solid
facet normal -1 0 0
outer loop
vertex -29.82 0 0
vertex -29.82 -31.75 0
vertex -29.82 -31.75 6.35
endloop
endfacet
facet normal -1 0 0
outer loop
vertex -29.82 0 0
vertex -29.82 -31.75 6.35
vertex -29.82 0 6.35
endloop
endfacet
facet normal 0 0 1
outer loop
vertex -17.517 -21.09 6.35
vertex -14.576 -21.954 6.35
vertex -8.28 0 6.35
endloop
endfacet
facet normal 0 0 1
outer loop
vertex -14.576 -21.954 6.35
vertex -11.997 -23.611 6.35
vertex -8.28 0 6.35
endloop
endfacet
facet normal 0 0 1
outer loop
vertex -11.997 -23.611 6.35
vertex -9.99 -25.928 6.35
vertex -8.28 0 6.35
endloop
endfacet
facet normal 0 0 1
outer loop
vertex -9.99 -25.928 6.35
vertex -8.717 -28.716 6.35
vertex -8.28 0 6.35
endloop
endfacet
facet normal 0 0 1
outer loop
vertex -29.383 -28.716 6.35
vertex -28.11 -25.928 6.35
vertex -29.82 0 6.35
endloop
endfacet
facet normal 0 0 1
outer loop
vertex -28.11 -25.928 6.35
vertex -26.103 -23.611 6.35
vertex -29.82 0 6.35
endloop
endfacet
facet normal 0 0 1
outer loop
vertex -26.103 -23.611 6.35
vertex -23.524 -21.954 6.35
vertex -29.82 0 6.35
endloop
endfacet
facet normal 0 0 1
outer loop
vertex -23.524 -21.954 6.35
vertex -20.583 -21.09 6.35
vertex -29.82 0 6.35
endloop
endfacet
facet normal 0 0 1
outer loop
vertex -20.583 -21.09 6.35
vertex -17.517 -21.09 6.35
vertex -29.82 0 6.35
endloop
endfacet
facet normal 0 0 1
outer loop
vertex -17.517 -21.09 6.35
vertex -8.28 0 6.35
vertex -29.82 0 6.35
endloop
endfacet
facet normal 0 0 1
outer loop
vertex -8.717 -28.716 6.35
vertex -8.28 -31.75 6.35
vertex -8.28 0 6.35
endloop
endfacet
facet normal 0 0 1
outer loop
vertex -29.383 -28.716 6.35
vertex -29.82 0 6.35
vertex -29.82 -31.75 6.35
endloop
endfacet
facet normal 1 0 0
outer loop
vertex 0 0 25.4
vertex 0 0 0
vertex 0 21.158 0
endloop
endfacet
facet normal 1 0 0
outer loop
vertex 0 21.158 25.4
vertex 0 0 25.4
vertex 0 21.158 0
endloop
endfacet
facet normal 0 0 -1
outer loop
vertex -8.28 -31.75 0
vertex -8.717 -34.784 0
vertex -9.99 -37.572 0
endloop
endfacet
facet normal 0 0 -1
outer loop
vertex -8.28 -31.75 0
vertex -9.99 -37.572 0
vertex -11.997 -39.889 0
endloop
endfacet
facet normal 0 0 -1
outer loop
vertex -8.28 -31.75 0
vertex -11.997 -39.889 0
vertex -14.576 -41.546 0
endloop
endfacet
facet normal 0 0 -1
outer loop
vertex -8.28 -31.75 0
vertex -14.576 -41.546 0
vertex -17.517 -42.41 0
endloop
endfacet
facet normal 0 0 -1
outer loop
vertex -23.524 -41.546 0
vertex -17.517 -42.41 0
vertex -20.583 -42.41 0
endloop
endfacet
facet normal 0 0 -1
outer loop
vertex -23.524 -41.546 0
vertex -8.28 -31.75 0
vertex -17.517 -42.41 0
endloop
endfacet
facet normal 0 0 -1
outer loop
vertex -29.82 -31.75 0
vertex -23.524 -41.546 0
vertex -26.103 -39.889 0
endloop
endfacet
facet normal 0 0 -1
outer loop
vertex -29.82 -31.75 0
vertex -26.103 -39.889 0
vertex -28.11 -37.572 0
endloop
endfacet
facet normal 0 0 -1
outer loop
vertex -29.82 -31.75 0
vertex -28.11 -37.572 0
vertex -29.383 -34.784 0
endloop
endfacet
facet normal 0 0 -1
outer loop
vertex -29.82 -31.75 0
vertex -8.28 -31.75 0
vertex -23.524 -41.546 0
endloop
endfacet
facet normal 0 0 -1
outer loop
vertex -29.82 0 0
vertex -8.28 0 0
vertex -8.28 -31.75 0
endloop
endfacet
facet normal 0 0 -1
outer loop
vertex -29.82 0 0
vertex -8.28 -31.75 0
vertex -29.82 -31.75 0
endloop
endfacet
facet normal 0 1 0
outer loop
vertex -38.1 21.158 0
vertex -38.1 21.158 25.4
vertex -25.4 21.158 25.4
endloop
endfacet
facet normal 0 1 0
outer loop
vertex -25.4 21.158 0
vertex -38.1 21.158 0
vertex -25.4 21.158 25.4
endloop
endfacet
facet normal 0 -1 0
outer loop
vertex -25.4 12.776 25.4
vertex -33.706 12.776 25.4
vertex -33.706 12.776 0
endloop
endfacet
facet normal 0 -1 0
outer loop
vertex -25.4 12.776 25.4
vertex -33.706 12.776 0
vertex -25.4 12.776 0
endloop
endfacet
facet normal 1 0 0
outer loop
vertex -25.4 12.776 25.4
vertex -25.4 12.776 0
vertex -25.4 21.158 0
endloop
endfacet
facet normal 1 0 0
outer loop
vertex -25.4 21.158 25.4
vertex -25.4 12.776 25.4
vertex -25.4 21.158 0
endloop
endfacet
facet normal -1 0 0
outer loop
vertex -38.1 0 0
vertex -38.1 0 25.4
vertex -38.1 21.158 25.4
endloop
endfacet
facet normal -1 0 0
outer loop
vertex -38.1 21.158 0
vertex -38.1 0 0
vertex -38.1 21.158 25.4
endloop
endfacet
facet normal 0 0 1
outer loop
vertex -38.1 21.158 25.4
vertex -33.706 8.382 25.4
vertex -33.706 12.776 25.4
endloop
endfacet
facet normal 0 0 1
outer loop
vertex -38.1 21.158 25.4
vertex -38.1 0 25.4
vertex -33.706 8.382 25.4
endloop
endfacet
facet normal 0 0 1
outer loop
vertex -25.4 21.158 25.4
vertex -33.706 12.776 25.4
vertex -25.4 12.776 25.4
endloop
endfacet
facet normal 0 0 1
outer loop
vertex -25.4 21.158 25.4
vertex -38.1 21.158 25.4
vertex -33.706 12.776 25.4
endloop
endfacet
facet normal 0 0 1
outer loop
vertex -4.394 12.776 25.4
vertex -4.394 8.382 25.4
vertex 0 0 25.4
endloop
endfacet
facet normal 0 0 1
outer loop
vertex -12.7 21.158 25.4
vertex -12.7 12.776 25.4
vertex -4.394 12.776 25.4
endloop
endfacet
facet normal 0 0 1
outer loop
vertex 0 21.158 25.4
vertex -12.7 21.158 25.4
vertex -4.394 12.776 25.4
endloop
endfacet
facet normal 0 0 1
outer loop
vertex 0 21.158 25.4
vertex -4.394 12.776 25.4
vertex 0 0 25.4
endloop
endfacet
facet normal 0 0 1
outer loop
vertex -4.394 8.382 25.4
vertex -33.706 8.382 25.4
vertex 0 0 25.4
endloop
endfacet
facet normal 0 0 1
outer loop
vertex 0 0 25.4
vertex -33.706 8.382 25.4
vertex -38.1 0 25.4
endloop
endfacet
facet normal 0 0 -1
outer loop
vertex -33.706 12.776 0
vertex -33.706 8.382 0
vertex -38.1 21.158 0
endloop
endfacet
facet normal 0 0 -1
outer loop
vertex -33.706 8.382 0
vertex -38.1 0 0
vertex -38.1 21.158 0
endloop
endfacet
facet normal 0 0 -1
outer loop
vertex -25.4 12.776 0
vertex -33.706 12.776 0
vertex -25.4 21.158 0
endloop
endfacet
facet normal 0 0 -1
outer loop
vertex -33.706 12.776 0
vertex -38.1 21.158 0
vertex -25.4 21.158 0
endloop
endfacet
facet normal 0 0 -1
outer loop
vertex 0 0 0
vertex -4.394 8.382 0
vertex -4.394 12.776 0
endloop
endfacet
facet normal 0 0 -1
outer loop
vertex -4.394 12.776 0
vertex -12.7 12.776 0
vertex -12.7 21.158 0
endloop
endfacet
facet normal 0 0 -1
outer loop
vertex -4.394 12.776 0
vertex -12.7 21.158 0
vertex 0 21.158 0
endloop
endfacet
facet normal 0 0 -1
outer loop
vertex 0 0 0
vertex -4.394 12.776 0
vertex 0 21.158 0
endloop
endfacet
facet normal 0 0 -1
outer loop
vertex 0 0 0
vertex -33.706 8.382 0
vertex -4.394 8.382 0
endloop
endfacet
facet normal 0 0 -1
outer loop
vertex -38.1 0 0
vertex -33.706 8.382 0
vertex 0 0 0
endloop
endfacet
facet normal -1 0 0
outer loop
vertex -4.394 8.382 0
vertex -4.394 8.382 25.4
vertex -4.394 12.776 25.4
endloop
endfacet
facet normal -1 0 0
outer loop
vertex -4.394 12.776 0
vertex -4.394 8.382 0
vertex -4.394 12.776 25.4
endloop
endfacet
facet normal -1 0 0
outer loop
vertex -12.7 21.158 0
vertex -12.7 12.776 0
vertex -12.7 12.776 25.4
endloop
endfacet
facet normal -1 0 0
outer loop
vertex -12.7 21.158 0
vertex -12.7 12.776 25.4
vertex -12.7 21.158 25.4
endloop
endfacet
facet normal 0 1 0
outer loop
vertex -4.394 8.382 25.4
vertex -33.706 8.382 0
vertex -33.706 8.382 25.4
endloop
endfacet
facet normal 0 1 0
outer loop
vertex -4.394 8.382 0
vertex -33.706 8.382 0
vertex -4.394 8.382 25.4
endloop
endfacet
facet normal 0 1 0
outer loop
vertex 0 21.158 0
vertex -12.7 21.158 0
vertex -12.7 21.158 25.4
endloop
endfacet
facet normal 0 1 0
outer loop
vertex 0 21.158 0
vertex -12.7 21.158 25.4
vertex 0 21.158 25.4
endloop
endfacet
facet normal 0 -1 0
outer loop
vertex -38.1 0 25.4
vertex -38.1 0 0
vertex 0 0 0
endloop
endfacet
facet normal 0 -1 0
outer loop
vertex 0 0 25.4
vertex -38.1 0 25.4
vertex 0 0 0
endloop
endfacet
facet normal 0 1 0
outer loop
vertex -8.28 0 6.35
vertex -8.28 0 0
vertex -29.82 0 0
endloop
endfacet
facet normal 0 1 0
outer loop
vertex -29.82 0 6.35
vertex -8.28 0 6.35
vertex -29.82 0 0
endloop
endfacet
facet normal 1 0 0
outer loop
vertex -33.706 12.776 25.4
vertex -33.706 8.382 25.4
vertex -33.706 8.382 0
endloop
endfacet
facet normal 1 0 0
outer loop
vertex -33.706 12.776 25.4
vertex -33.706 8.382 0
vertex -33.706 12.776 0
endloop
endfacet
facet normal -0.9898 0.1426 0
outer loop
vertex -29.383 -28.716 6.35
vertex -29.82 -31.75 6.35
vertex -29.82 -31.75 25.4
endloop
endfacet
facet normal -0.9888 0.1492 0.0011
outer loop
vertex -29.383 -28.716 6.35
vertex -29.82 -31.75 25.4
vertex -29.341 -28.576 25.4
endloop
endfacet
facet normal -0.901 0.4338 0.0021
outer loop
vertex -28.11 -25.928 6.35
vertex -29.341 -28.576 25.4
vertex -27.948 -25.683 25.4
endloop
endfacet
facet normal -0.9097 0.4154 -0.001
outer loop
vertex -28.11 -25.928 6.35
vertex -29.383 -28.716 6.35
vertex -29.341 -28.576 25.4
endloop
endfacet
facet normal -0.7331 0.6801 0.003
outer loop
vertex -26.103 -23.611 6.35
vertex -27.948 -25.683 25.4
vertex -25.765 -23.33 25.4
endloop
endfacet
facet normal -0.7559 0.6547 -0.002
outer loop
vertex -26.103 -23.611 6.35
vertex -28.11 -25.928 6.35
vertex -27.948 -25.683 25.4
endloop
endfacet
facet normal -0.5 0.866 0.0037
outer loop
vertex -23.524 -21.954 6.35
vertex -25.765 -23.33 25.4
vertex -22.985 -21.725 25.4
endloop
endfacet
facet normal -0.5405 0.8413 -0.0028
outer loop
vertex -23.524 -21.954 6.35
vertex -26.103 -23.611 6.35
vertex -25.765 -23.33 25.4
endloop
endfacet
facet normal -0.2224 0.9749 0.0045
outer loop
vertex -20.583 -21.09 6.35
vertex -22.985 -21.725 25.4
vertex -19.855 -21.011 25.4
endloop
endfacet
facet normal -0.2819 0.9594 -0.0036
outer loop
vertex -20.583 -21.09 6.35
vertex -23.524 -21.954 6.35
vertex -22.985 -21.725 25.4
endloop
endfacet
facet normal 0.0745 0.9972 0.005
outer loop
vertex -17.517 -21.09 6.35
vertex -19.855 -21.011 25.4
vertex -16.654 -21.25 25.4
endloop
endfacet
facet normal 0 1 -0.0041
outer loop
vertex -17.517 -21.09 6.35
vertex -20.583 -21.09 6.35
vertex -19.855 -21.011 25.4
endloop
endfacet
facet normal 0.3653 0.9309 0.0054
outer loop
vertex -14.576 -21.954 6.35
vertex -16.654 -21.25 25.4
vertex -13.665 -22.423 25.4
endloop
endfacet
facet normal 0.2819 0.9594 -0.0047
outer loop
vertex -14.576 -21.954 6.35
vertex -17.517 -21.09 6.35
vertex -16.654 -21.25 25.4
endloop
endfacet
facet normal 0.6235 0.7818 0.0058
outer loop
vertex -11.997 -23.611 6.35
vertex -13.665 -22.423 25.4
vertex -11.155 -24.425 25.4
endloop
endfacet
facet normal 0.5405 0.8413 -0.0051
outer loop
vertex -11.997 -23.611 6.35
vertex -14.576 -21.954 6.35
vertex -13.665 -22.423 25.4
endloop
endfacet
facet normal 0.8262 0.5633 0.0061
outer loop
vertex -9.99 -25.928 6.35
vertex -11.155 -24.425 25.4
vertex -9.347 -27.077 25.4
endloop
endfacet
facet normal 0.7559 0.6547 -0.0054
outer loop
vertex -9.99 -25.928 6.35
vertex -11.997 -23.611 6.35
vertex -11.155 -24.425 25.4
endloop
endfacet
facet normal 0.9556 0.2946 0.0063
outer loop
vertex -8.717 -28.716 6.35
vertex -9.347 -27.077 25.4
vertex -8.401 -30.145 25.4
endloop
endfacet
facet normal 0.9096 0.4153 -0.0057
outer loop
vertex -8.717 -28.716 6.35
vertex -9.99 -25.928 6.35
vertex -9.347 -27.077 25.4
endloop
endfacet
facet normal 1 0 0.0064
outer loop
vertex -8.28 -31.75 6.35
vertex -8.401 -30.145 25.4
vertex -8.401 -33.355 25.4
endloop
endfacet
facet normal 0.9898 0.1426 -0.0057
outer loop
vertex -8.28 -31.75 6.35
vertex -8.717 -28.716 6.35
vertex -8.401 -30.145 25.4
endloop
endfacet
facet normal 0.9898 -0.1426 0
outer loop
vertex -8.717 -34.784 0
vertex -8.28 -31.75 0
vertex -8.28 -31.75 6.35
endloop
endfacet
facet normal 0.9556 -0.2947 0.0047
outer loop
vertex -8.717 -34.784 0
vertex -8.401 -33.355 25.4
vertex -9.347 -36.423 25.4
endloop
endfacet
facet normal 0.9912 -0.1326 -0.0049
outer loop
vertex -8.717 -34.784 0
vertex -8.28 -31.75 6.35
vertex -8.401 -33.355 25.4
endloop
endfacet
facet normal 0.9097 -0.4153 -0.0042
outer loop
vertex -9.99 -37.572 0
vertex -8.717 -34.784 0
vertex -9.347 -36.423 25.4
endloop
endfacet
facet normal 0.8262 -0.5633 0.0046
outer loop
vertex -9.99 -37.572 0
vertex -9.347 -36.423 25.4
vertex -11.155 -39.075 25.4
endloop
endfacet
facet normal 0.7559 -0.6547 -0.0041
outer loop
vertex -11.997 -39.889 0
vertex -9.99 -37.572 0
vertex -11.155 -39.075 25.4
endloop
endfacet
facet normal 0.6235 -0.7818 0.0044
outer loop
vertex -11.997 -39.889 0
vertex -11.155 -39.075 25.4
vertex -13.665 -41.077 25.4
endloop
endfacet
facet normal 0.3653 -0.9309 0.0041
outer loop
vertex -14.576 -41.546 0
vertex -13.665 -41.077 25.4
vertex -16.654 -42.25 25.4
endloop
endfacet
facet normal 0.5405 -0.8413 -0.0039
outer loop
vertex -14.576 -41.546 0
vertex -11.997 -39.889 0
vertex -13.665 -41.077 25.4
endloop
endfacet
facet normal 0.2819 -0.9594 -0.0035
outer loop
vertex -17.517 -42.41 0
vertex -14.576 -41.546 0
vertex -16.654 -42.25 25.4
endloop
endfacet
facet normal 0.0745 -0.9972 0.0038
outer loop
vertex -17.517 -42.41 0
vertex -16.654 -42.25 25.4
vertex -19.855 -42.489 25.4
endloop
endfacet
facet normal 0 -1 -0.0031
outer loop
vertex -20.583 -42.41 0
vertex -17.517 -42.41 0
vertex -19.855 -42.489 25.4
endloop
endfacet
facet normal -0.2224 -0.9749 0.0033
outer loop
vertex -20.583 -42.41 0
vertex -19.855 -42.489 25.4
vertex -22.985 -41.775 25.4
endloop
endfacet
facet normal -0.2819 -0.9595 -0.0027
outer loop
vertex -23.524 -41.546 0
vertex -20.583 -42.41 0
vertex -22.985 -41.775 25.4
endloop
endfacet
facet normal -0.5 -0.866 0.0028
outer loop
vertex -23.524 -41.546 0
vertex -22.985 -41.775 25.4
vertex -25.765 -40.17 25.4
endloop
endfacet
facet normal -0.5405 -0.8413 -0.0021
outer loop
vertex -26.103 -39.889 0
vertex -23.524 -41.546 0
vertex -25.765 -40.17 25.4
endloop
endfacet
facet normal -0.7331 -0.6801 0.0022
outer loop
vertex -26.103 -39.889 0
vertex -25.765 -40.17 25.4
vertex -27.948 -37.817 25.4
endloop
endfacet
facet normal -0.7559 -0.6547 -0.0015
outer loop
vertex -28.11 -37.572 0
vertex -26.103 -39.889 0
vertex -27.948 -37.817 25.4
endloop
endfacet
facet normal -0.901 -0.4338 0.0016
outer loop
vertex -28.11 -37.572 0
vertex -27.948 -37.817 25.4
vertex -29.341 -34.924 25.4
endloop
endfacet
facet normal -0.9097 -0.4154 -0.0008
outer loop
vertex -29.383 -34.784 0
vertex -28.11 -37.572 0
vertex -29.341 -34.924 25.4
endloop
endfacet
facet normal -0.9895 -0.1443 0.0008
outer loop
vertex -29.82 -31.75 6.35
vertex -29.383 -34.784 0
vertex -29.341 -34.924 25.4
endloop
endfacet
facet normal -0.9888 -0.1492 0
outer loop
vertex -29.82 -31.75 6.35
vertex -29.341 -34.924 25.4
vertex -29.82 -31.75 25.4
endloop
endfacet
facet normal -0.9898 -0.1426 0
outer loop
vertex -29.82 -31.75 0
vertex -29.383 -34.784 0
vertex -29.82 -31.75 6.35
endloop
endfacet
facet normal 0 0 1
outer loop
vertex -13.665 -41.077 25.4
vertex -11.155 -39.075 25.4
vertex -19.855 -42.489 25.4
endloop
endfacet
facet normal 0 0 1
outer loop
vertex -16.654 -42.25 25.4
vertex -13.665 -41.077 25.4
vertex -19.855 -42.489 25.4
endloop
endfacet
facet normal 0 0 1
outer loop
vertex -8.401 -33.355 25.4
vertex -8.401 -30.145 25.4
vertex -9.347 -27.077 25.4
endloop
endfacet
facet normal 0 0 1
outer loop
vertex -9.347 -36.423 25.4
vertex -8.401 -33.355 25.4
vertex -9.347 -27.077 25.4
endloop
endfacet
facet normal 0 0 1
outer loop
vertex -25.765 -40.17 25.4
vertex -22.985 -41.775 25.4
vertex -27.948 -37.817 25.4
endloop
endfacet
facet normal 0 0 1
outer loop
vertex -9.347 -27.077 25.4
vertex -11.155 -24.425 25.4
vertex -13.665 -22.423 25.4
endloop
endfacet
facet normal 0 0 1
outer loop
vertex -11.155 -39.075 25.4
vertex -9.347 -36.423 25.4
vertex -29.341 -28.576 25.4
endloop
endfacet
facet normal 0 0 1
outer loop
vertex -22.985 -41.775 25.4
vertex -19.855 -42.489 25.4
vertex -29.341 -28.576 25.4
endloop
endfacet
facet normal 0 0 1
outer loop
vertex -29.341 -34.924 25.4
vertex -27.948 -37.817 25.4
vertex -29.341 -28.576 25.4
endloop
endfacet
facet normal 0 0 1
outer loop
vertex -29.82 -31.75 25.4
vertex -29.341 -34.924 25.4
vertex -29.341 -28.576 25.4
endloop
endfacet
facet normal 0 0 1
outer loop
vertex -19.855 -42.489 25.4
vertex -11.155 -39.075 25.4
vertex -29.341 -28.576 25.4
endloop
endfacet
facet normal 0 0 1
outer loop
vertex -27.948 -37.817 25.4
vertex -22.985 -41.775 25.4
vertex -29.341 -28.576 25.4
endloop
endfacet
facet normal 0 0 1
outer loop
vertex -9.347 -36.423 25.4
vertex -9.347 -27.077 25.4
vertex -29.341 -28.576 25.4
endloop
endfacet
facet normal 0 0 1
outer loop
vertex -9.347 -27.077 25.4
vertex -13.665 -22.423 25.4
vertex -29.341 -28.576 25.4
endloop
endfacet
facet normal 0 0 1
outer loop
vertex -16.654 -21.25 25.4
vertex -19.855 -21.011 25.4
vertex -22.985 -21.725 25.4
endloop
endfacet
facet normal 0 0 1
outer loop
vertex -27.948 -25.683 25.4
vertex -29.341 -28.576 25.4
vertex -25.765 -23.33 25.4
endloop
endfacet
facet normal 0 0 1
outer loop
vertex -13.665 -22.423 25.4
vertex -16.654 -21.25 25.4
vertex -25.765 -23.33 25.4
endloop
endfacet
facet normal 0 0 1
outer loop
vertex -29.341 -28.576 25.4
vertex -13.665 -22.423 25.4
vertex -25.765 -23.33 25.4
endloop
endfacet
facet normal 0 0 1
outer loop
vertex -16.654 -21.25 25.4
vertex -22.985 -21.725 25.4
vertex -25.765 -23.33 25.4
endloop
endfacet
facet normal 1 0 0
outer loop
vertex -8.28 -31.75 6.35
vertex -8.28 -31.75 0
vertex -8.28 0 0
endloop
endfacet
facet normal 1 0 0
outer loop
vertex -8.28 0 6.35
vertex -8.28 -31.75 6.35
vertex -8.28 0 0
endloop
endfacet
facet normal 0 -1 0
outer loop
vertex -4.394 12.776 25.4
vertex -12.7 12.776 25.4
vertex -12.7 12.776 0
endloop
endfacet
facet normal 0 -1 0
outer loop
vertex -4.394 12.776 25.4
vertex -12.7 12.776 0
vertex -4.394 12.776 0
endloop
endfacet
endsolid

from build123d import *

# Parameters (mm, degrees)
SKETCH1_W           = 38.1
SKETCH1_H           = 8.382
BOSS_EXTRUDE1_DEPTH = 25.4
SKETCH2_W           = 4.3942
SKETCH2_H           = 4.3942
BOSS_EXTRUDE2_DEPTH = 25.4
SKETCH3_W           = 12.7
SKETCH3_H           = 8.382
BOSS_EXTRUDE3_DEPTH = 25.4
SKETCH4_W           = 21.5392
SKETCH4_H           = 31.75
BOSS_EXTRUDE4_DEPTH = 6.35
SKETCH5_R           = 10.7696
BOSS_EXTRUDE5_DEPTH = 25.4


with BuildPart() as part:
    # Sketch1 → Boss-Extrude1 (new body)
    with BuildSketch(Plane.XY):
        with Locations((-19.05, 4.191)):
            Rectangle(SKETCH1_W, SKETCH1_H)
    extrude(amount=BOSS_EXTRUDE1_DEPTH)

    # Sketch2 → Boss-Extrude2 (add)
    with BuildSketch(Plane.XY.offset(25.4)):
        with Locations((-35.9029, 10.5791)):
            Rectangle(SKETCH2_W, SKETCH2_H)
        with Locations((-2.1971, 10.5791)):
            Rectangle(SKETCH2_W, SKETCH2_H)
    extrude(amount=-BOSS_EXTRUDE2_DEPTH)

    # Sketch3 → Boss-Extrude3 (add)
    with BuildSketch(Plane.XY.offset(25.4)):
        with Locations((-31.75, 16.9672)):
            Rectangle(SKETCH3_W, SKETCH3_H)
        with Locations((-6.35, 16.9672)):
            Rectangle(SKETCH3_W, SKETCH3_H)
    extrude(amount=-BOSS_EXTRUDE3_DEPTH)


with BuildPart() as body_2:
    # Sketch4 → Boss-Extrude4 (new body)
    with BuildSketch(Plane(origin=(0, 0, 0), x_dir=(-1, 0, 0), z_dir=(0, 0, -1))):
        with Locations((19.05, -15.875)):
            Rectangle(SKETCH4_W, SKETCH4_H)
    extrude(amount=-BOSS_EXTRUDE4_DEPTH)

    # Sketch5 → Boss-Extrude5 (add)
    with BuildSketch(Plane(origin=(0, 0, 0), x_dir=(-1, 0, 0), z_dir=(0, 0, -1))):
        with Locations((19.05, -31.75)):
            Circle(SKETCH5_R)
    extrude(amount=-BOSS_EXTRUDE5_DEPTH)


solid = Compound([part.part, body_2.part])
